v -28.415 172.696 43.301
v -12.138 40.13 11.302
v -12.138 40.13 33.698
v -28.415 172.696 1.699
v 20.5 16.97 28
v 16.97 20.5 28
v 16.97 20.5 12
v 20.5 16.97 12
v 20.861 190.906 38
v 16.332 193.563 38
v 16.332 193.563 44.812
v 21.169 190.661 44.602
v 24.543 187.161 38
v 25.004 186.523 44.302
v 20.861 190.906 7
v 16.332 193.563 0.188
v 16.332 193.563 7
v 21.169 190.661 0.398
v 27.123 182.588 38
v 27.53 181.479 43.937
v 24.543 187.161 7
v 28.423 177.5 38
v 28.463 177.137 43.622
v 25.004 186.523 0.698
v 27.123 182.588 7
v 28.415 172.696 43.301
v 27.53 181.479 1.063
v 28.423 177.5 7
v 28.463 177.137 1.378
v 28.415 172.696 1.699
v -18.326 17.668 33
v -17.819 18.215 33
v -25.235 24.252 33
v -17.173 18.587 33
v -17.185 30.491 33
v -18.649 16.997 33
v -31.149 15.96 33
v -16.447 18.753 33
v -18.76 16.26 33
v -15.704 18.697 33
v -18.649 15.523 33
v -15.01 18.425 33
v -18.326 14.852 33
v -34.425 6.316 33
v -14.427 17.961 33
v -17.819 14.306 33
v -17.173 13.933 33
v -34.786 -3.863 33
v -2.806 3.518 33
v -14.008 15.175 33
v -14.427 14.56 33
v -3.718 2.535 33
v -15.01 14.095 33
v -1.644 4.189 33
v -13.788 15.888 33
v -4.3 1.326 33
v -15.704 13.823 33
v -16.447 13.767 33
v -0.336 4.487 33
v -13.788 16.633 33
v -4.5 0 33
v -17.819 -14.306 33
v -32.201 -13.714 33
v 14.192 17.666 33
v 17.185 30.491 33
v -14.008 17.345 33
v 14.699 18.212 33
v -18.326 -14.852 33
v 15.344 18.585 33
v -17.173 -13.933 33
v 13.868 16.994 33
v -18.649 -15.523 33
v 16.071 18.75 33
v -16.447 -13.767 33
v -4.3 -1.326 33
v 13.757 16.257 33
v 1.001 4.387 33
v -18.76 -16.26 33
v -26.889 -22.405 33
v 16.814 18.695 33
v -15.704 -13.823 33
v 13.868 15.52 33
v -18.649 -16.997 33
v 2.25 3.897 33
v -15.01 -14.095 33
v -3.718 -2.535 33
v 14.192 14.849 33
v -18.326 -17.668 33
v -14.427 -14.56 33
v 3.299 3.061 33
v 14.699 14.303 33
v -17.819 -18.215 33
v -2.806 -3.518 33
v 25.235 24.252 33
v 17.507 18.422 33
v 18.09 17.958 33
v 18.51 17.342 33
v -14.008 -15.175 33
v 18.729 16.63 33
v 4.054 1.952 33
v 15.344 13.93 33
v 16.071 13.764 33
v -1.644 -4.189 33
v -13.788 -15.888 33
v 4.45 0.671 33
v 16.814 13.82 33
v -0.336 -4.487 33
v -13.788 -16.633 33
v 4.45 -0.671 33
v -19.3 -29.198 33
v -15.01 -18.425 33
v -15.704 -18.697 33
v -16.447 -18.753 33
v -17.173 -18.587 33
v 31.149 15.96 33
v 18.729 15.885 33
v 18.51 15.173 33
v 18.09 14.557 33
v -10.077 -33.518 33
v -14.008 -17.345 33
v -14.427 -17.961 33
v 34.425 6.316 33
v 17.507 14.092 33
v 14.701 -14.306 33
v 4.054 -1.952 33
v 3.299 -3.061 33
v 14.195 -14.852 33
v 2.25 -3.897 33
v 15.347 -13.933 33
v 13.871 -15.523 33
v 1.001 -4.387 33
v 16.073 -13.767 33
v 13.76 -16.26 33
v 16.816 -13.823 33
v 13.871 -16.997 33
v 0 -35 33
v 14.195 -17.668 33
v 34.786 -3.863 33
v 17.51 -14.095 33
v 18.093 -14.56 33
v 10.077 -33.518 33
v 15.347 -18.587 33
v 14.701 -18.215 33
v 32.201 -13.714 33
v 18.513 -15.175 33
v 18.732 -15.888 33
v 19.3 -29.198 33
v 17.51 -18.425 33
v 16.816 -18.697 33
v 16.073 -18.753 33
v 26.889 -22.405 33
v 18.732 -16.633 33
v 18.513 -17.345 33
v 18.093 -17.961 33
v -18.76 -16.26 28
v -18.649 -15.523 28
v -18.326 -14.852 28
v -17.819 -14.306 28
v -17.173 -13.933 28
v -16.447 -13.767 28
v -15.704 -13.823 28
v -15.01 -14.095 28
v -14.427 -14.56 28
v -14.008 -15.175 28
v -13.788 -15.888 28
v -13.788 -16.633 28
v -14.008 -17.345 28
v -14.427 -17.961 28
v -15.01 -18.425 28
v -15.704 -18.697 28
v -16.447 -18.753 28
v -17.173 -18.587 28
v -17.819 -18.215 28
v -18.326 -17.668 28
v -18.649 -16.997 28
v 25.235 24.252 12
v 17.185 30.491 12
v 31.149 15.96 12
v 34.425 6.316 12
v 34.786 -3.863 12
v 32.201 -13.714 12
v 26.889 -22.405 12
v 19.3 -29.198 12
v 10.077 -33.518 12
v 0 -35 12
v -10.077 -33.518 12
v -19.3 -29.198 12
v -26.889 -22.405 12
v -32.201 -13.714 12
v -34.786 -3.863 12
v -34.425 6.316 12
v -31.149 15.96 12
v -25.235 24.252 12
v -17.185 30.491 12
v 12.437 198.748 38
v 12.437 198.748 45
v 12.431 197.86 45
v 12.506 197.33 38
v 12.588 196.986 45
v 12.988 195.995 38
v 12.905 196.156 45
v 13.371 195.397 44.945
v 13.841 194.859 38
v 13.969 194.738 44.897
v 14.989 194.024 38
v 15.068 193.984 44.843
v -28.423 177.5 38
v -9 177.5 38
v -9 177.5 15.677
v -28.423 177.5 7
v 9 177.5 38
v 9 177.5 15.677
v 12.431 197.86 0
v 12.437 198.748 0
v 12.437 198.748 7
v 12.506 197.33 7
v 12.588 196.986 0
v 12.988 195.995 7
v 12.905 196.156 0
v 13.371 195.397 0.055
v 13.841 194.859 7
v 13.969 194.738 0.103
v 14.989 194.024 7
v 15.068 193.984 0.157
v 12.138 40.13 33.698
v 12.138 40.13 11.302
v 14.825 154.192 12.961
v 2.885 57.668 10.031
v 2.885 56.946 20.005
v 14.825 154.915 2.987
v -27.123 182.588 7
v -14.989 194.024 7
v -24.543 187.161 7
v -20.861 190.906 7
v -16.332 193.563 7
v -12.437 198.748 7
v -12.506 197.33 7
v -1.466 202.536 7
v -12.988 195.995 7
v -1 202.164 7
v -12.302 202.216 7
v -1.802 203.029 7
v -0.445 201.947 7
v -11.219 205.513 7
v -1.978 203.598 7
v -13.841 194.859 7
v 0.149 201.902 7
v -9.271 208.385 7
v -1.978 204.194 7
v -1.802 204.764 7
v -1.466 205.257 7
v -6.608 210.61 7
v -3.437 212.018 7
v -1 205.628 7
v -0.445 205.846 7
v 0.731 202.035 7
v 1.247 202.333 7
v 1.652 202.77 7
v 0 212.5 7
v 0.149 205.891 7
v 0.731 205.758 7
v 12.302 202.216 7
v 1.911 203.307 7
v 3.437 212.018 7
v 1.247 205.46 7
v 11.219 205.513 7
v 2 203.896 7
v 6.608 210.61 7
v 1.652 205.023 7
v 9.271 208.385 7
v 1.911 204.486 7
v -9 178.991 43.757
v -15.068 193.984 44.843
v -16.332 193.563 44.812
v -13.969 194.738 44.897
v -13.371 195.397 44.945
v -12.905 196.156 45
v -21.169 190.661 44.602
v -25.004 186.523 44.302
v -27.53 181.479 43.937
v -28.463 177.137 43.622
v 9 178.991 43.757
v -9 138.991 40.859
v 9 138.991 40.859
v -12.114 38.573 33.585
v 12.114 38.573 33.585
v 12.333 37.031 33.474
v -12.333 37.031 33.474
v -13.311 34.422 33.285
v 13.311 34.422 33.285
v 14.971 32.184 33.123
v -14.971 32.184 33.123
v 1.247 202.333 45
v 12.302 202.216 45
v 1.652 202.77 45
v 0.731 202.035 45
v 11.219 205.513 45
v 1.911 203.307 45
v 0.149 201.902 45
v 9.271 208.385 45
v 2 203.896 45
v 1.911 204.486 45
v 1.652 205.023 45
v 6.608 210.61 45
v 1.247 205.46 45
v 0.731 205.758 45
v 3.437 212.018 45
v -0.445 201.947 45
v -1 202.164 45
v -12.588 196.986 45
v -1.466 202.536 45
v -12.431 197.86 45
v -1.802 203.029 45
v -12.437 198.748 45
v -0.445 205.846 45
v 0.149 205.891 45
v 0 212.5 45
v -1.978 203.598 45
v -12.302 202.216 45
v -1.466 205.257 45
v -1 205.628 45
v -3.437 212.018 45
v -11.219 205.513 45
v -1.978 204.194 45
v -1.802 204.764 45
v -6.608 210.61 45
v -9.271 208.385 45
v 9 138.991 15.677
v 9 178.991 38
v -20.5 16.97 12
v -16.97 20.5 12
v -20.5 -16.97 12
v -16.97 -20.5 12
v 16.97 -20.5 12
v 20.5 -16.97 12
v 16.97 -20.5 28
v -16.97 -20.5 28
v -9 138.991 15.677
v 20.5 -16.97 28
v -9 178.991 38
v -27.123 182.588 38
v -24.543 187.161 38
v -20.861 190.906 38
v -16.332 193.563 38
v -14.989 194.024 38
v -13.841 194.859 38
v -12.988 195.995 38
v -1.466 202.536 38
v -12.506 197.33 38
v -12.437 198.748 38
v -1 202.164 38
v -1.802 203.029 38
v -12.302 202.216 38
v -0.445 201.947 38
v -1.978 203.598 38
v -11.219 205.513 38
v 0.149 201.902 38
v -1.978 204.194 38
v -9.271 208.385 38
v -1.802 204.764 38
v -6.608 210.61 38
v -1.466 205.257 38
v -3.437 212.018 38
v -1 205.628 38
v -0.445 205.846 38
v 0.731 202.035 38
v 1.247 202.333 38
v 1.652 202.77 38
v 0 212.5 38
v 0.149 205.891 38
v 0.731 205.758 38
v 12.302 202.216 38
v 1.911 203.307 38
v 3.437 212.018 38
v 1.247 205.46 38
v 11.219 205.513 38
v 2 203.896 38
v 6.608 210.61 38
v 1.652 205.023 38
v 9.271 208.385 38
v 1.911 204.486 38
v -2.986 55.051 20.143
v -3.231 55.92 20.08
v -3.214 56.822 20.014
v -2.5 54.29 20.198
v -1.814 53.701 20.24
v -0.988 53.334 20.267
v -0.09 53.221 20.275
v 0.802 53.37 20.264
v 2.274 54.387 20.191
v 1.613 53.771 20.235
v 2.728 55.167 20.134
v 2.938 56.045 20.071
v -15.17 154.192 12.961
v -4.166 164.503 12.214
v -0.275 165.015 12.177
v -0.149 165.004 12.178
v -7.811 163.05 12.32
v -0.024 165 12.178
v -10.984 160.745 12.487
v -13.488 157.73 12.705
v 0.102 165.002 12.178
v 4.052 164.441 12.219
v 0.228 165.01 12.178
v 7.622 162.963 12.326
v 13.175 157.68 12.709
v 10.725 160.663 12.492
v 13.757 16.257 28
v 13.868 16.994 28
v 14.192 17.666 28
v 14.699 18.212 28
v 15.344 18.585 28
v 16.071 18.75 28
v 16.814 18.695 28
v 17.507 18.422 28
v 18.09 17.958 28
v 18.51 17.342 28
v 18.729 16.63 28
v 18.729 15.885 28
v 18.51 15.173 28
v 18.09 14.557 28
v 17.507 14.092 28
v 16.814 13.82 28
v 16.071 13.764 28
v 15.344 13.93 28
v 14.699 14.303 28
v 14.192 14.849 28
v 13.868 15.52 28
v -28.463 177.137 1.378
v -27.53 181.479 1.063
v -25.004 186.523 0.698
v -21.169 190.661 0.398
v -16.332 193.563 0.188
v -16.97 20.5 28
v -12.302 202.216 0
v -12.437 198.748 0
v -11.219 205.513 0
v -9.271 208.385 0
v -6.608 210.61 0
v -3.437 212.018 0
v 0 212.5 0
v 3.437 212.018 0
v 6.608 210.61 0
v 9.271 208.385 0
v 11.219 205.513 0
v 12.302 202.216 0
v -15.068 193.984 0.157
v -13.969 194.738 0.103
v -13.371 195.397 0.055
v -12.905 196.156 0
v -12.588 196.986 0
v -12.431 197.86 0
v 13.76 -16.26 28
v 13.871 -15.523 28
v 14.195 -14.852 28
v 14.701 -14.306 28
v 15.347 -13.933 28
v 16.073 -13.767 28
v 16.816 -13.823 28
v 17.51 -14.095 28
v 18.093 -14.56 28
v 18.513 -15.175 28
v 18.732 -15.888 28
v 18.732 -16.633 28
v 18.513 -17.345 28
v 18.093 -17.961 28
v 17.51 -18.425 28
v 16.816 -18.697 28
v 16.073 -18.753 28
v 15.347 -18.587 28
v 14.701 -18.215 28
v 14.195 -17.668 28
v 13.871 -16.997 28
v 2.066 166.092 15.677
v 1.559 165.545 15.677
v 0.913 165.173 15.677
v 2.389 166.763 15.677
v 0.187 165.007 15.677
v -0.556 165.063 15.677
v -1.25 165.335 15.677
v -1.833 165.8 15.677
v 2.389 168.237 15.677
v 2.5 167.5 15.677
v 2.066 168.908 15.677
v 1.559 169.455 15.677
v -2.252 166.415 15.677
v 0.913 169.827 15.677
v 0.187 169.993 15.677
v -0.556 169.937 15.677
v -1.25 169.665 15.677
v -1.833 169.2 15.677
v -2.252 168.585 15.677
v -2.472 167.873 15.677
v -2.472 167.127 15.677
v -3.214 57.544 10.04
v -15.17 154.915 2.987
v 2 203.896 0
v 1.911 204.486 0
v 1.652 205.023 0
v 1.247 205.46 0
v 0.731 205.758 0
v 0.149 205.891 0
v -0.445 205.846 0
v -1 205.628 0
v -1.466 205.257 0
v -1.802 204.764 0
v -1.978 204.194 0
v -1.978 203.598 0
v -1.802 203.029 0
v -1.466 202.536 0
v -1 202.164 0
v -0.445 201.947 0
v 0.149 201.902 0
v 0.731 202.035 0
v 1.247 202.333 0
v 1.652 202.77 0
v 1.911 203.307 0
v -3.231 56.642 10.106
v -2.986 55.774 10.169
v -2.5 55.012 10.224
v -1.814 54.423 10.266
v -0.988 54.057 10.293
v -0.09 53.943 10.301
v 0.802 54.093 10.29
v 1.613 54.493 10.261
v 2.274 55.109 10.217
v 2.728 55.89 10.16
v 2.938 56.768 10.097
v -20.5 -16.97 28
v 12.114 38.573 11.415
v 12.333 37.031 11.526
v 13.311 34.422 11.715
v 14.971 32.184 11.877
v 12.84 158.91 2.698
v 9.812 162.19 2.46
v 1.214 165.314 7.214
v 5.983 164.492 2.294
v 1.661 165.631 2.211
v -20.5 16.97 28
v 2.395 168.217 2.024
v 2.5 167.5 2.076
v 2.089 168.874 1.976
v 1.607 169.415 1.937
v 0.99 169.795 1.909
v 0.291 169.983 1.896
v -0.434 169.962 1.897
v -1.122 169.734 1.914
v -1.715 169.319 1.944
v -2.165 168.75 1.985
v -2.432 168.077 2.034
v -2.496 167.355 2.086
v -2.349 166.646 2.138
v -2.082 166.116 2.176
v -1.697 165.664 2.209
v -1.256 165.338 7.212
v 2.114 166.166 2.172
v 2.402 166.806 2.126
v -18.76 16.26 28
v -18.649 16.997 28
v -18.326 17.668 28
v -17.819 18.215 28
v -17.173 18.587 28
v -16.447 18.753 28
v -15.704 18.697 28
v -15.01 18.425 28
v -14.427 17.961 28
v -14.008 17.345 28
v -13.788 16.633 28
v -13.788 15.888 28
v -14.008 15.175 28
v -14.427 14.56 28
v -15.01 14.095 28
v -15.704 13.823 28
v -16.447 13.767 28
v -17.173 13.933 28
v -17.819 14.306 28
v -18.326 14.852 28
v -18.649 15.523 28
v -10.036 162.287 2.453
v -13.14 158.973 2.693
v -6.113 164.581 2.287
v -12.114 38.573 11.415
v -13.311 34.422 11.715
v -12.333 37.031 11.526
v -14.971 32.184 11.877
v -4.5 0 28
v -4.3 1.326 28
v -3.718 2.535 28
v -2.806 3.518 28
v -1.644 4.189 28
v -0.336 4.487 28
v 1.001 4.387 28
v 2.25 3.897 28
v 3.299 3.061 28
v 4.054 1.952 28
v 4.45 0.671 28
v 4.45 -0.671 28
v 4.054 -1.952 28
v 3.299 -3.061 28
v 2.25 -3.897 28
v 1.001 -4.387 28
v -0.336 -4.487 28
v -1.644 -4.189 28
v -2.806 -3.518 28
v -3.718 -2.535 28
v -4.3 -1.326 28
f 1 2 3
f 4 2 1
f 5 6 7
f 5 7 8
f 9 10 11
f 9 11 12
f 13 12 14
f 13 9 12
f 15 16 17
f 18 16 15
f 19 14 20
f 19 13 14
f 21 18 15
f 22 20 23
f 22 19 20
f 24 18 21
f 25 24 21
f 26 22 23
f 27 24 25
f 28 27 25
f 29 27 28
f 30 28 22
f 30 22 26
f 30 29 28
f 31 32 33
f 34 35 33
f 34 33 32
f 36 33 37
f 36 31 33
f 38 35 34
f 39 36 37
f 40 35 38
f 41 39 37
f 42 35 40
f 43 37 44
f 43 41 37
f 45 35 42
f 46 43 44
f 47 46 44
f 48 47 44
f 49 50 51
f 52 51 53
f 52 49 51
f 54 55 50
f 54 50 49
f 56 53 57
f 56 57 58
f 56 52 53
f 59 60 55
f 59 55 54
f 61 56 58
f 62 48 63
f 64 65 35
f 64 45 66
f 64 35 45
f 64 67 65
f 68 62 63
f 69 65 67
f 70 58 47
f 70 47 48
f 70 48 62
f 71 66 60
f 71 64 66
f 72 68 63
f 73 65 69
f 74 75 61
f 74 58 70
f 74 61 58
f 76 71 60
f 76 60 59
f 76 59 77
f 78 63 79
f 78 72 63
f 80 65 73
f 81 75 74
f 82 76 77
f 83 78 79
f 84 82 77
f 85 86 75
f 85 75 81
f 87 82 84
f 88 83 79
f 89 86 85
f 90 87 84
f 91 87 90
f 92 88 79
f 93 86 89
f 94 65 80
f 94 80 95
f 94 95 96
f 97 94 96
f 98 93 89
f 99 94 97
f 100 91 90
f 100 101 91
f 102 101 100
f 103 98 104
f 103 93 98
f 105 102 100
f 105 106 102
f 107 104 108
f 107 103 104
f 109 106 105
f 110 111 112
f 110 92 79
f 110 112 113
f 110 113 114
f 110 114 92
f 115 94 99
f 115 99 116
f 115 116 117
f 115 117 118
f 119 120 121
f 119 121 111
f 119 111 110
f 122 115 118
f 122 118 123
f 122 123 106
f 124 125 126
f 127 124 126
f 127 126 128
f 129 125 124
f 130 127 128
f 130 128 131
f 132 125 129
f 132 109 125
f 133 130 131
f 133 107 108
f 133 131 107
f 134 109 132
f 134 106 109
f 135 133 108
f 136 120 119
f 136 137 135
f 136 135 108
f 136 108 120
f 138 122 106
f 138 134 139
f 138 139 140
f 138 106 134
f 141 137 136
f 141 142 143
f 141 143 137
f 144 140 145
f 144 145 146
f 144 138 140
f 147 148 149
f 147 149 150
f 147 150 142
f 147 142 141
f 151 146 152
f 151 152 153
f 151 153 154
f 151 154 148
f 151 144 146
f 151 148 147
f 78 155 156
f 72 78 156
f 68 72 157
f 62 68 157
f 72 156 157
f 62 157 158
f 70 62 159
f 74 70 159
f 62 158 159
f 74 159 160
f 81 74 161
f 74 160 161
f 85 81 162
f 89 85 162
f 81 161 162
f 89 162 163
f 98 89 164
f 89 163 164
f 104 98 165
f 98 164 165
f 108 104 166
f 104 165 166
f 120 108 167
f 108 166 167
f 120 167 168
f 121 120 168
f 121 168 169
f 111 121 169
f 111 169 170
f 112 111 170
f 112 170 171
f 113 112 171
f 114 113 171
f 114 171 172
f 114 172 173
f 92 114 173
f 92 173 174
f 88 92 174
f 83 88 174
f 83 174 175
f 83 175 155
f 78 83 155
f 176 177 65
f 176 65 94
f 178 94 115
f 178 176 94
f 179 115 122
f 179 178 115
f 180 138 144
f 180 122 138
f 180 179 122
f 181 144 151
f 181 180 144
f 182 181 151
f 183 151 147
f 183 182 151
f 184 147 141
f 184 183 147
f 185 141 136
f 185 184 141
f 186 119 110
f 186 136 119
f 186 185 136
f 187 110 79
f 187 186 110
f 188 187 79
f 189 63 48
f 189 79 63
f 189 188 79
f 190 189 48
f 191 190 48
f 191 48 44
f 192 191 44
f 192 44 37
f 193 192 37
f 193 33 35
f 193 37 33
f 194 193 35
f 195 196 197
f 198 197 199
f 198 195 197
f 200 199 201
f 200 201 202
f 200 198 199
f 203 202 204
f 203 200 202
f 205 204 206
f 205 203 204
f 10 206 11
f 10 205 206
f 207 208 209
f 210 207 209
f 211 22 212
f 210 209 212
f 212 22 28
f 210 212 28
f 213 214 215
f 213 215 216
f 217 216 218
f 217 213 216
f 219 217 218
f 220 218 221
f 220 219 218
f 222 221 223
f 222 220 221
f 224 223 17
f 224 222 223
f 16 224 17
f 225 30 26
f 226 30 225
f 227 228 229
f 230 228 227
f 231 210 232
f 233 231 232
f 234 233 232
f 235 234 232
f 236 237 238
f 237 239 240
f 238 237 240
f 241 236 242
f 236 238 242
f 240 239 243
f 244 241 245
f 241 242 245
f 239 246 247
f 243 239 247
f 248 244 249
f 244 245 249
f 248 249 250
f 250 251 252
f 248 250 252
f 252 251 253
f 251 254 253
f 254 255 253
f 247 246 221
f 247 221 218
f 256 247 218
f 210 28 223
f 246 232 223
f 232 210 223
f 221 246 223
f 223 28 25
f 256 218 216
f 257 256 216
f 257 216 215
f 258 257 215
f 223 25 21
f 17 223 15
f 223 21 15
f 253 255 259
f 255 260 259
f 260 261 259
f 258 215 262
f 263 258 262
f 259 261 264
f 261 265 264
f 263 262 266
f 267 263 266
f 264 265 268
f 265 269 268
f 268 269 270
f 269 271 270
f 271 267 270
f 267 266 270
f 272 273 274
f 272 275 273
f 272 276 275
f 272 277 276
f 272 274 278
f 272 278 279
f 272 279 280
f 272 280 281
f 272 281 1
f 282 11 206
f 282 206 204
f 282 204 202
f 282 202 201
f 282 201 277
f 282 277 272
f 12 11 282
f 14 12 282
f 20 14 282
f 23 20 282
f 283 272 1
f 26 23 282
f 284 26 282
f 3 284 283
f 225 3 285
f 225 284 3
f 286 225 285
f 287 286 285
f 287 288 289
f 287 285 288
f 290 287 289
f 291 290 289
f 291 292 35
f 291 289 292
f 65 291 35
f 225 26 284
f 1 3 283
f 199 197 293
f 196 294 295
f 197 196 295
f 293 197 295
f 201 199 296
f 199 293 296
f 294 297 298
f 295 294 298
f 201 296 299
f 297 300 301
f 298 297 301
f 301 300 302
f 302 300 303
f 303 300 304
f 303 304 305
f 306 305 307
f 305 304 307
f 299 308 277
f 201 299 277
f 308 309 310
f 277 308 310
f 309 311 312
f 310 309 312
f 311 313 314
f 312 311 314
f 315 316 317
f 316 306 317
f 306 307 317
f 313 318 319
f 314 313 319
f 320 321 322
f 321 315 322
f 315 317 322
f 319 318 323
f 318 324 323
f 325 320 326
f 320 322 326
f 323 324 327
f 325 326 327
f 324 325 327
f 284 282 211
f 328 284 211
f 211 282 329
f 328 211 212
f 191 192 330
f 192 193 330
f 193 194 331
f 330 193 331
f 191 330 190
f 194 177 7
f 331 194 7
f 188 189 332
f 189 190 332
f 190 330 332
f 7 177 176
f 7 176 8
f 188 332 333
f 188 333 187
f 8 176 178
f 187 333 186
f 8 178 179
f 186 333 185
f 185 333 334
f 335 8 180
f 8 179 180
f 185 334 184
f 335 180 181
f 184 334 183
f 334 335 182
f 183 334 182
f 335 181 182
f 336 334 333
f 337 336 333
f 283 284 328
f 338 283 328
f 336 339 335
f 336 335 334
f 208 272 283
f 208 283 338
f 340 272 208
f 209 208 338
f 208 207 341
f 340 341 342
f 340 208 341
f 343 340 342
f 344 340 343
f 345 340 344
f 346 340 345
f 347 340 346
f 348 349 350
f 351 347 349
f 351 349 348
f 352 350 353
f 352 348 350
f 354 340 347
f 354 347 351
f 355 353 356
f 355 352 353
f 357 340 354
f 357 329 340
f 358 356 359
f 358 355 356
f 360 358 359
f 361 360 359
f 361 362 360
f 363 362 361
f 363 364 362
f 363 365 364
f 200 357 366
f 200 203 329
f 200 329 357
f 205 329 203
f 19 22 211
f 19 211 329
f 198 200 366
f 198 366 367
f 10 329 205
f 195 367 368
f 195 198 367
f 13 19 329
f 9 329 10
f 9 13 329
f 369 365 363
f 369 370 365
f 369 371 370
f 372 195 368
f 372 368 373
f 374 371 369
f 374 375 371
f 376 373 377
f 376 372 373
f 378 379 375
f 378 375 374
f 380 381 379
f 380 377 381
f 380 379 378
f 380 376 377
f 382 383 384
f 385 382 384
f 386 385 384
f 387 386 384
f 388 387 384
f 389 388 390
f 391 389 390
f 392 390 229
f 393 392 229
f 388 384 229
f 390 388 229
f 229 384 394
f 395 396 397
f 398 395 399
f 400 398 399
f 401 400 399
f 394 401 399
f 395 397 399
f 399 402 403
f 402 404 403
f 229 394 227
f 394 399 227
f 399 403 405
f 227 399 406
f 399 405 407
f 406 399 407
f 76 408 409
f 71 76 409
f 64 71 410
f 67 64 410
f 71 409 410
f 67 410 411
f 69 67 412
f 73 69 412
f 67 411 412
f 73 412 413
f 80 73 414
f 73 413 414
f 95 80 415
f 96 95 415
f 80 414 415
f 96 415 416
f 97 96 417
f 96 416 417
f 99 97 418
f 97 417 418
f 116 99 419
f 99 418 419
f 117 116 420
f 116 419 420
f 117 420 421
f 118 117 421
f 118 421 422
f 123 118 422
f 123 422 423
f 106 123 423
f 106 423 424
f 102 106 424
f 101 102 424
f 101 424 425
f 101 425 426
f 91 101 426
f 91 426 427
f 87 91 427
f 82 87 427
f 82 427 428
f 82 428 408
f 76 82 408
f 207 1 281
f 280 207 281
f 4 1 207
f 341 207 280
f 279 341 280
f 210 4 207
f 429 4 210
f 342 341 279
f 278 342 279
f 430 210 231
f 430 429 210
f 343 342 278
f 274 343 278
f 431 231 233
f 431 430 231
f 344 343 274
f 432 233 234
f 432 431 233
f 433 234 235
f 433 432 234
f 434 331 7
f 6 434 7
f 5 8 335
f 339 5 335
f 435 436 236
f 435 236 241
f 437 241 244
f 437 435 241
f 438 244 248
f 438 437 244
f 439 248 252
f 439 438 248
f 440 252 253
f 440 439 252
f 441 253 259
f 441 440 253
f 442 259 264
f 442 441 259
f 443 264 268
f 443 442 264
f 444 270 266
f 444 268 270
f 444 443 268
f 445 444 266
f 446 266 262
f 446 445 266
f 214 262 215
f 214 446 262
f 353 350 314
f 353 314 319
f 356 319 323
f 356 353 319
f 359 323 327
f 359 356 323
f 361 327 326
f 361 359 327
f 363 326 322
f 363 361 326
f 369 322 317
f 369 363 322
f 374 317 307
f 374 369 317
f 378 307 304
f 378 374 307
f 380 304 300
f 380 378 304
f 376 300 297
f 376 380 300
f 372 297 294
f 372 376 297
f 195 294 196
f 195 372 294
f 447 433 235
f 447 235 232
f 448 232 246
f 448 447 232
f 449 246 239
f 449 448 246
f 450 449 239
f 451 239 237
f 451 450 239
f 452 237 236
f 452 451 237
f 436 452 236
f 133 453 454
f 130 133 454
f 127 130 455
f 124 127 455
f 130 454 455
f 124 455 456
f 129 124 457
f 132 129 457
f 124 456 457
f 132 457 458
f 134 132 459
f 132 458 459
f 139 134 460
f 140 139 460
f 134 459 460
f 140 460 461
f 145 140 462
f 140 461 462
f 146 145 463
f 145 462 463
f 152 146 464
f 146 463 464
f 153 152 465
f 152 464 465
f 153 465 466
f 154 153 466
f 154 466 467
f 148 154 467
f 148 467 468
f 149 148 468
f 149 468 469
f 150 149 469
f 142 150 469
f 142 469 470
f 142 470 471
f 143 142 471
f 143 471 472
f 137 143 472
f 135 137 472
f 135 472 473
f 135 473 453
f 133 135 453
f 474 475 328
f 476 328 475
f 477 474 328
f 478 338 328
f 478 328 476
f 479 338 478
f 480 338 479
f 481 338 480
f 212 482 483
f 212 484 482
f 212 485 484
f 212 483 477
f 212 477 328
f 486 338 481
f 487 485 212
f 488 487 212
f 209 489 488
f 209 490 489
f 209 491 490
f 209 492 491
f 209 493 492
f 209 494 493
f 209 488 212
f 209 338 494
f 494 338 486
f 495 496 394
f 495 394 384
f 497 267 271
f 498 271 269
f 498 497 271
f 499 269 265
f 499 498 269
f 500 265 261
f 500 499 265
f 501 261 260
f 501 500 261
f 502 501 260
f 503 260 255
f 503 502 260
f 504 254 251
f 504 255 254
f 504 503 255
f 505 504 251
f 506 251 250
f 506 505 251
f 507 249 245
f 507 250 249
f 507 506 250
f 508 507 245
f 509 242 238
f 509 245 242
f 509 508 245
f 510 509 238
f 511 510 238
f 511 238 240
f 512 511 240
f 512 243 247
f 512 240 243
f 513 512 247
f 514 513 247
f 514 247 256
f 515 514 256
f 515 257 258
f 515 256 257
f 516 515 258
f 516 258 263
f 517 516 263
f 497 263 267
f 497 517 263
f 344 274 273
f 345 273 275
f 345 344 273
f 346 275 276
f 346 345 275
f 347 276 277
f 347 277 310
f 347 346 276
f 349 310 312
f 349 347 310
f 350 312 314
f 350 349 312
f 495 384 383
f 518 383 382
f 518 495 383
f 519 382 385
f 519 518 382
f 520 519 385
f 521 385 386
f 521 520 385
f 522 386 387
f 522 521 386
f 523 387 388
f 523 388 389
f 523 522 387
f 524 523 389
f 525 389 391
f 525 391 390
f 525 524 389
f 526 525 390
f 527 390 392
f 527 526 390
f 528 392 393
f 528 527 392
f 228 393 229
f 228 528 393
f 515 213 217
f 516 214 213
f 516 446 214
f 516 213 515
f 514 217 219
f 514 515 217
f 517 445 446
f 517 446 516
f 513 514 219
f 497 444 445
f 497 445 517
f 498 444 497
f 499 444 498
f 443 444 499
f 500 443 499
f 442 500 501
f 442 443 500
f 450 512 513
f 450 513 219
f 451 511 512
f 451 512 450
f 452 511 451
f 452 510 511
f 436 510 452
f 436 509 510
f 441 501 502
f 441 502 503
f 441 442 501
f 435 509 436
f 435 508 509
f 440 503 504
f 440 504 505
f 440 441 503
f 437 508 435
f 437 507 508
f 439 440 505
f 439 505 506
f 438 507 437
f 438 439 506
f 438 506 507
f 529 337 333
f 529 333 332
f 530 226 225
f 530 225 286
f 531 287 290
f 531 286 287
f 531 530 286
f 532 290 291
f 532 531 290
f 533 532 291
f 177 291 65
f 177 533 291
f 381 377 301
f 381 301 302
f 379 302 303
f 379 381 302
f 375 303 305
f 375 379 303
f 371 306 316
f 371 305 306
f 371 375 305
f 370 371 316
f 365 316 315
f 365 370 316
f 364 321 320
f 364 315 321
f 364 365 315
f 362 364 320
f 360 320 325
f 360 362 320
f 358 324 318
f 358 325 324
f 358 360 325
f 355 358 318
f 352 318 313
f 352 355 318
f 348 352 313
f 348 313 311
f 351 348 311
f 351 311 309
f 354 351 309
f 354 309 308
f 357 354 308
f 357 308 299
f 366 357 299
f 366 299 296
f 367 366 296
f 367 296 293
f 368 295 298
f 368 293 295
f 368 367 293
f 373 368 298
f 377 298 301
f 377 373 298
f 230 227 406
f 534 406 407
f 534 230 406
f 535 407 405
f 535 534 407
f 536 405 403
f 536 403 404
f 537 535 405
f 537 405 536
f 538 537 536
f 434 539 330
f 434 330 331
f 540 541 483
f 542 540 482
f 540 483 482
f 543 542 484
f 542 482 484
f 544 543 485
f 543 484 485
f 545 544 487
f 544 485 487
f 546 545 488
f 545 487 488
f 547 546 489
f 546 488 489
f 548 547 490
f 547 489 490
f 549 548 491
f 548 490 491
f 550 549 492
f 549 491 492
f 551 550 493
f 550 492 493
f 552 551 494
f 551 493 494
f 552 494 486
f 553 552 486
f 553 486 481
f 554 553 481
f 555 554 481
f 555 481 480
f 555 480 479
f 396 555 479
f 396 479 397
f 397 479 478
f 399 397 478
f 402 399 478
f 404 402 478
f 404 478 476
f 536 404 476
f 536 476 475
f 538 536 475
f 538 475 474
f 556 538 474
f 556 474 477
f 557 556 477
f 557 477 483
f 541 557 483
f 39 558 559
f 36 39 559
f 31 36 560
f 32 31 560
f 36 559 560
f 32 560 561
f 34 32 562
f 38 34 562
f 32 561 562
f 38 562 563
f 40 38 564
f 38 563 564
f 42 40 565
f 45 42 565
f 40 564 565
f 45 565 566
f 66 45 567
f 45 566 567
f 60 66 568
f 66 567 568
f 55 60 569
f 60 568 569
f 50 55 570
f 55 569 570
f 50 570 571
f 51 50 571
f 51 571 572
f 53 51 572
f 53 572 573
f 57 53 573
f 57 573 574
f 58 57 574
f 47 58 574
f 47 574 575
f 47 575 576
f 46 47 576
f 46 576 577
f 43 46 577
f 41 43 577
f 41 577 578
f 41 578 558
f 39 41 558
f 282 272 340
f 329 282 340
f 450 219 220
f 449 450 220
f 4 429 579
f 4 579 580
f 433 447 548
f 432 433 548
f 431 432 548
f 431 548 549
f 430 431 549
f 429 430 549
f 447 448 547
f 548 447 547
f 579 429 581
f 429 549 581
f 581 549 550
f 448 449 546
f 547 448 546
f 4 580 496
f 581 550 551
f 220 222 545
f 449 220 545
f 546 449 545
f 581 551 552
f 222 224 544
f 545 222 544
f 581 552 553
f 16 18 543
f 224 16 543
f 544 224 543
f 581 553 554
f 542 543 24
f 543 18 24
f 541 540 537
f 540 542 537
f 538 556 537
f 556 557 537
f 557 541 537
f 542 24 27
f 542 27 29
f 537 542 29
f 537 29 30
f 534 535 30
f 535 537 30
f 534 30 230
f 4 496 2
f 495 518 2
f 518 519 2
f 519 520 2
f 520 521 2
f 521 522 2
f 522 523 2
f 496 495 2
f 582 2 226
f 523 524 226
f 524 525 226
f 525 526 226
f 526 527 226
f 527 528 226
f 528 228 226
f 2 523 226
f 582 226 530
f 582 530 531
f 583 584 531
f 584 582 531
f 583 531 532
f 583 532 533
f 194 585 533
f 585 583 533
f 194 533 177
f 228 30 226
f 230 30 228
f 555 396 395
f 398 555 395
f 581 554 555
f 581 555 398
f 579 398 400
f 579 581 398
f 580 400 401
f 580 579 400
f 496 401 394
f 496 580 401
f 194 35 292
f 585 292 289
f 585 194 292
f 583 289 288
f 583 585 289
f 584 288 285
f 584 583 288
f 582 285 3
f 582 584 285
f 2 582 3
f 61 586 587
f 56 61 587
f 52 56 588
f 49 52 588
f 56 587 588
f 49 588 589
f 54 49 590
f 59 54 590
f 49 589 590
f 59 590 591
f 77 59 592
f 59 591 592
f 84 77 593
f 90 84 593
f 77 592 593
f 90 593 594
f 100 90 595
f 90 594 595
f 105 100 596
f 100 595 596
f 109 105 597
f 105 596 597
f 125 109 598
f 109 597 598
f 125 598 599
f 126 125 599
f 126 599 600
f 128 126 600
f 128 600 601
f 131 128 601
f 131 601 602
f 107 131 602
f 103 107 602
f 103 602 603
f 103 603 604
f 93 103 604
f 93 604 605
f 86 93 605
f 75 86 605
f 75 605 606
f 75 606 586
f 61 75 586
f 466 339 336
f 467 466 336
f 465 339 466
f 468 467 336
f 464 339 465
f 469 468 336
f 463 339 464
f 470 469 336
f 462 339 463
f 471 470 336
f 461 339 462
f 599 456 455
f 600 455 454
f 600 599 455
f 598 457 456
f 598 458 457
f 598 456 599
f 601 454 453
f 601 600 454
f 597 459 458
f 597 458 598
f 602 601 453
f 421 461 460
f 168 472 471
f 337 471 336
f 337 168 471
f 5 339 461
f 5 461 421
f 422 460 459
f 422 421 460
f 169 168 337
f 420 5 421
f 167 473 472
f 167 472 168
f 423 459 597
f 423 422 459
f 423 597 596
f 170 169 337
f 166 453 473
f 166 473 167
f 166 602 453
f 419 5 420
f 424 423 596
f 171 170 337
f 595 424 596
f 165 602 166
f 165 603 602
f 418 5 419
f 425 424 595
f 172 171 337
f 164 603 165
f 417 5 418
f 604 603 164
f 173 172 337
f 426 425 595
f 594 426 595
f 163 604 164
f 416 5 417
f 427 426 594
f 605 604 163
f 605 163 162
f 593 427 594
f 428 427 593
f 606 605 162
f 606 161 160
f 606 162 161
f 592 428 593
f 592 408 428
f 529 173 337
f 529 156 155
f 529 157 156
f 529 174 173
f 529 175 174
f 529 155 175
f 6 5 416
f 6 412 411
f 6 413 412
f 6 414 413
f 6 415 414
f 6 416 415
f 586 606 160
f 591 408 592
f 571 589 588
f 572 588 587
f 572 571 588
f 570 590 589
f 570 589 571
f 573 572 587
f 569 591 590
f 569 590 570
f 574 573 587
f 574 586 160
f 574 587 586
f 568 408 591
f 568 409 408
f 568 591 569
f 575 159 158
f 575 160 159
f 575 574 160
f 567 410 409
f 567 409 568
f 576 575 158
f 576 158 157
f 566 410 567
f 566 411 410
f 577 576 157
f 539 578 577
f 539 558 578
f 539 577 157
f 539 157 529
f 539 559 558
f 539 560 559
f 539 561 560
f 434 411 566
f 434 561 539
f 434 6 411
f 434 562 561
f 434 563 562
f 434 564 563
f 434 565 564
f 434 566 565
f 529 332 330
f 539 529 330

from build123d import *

# Parameters (mm, degrees)
BOSS_EXTRUDE1_DEPTH      = 45
CUT_EXTRUDE2_DEPTH       = 36
CUT_EXTRUDE2_DEPTH_BACK  = 36
CUT_EXTRUDE3_DEPTH       = 28
SKETCH6_R                = 4.5
SKETCH6_R_2              = 2.5
CUT_EXTRUDE4_DEPTH       = 29
CUT_EXTRUDE4_DEPTH_BACK  = 18
CUT_EXTRUDE6_DEPTH       = 10
SKETCH12_W               = 33
SKETCH12_H               = 40
CUT_EXTRUDE9_DEPTH       = 9
CUT_EXTRUDE9_DEPTH_BACK  = 9
SKETCH13_W               = 31
SKETCH13_H               = 35
CUT_EXTRUDE10_DEPTH      = 36
CUT_EXTRUDE10_DEPTH_BACK = 36
SKETCH14_R               = 2
CUT_EXTRUDE13_DEPTH      = 46
CUT_EXTRUDE13_DEPTH_BACK = 9
SKETCH15_R               = 2.5
CUT_EXTRUDE14_DEPTH      = 16.676509358


with BuildPart() as part:
    # Sketch1 → Boss-Extrude1 (new body)
    with BuildSketch(Plane.XY):
        with BuildLine():
            Line((-12.137605226, 40.130176139), (-28.41462727, 172.695882476))
            ThreePointArc((-28.41462727, 172.695882476), (-25.871526221, 185.155210183), (-16.331642516, 193.563112938))
            ThreePointArc((-16.331642516, 193.563112938), (-13.372104724, 195.395277041), (-12.437153877, 198.748120036))
            ThreePointArc((-12.437153877, 198.748120036), (0, 212.5), (12.437153877, 198.748120036))
            ThreePointArc((12.437153877, 198.748120036), (13.372104724, 195.395277041), (16.331642516, 193.563112938))
            ThreePointArc((16.331642516, 193.563112938), (25.871526221, 185.155210183), (28.41462727, 172.695882476))
            Line((28.41462727, 172.695882476), (12.137605226, 40.130176139))
            ThreePointArc((12.137605226, 40.130176139), (13.235334505, 34.563989878), (17.184596043, 30.490812695))
            ThreePointArc((17.184596043, 30.490812695), (0, -35), (-17.184596043, 30.490812695))
            ThreePointArc((-17.184596043, 30.490812695), (-13.235334505, 34.563989878), (-12.137605226, 40.130176139))
        make_face()
    extrude(amount=BOSS_EXTRUDE1_DEPTH)

    # Sketch4 → Cut-Extrude2 (cut, two sides)
    with BuildSketch(Plane(origin=(0, 0, 0), x_dir=(0, 0, -1), z_dir=(1, 0, 0))) as cut_extrude2_sk:
        Polygon((-45, 196.155616487), (-33, 30.490812695), (-33, -35), (-45, -35), align=None)
        Polygon((-12, -35), (0, -35), (0, 196.155616487), (-12, 30.490812695), align=None)
    extrude(amount=CUT_EXTRUDE2_DEPTH, mode=Mode.SUBTRACT)
    extrude(cut_extrude2_sk.sketch, amount=-CUT_EXTRUDE2_DEPTH_BACK, mode=Mode.SUBTRACT)

    # Sketch5 → Cut-Extrude3 (cut)
    with BuildSketch(Plane.XY):
        Polygon((16.97, -20.5), (-16.97, -20.5), (-20.5, -16.97), (-20.5, 16.97), (-16.97, 20.5), (16.97, 20.5), (20.5, 16.97), (20.5, -16.97), align=None)
    extrude(amount=CUT_EXTRUDE3_DEPTH, mode=Mode.SUBTRACT)

    # Sketch6 → Cut-Extrude4 (cut, two sides)
    with BuildSketch(Plane(origin=(0, 0, 28), x_dir=(-1, 0, 0), z_dir=(0, 0, -1))) as cut_extrude4_sk:
        Circle(SKETCH6_R)
        with Locations((-16.257359313, 16.257359313)):
            Circle(SKETCH6_R_2)
        with Locations((16.260126266, 16.260126266)):
            Circle(SKETCH6_R_2)
        with Locations((-16.260126266, -16.260126266)):
            Circle(SKETCH6_R_2)
        with Locations((16.260126266, -16.260126266)):
            Circle(SKETCH6_R_2)
    extrude(amount=CUT_EXTRUDE4_DEPTH, mode=Mode.SUBTRACT)
    extrude(cut_extrude4_sk.sketch, amount=-CUT_EXTRUDE4_DEPTH_BACK, mode=Mode.SUBTRACT)

    # Sketch8 → Cut-Extrude6 (cut, along a direction that is not the sketch's normal)
    with BuildSketch(Plane(origin=(0, 1.023835067, 14.134452964), x_dir=(-1, 0, 0), z_dir=(0, -0.072246136, -0.997386834))):
        with BuildLine():
            Line((-2.88453501, 56.792957469), (-14.82487519, 154.294010847))
            ThreePointArc((-14.82487519, 154.294010847), (0.17238227, 165.145626965), (15.16963973, 154.294010847))
            Line((15.16963973, 154.294010847), (3.214085595, 56.668725114))
            ThreePointArc((3.214085595, 56.668725114), (0.089957546, 53.058005434), (-2.88453501, 56.792957469))
        make_face()
    extrude(amount=-CUT_EXTRUDE6_DEPTH, dir=(0, 0.072246136, -0.997386834), mode=Mode.SUBTRACT)

    # Sketch12 → Cut-Extrude9 (cut, two sides)
    with BuildSketch(Plane(origin=(0, 0, 0), x_dir=(0, 0, -1), z_dir=(1, 0, 0))) as cut_extrude9_sk:
        with Locations((-32.176509358, 158.99066374)):
            Rectangle(SKETCH12_W, SKETCH12_H)
    extrude(amount=CUT_EXTRUDE9_DEPTH, mode=Mode.SUBTRACT)
    extrude(cut_extrude9_sk.sketch, amount=-CUT_EXTRUDE9_DEPTH_BACK, mode=Mode.SUBTRACT)

    # Sketch13 → Cut-Extrude10 (cut, two sides)
    with BuildSketch(Plane(origin=(0, 0, 0), x_dir=(0, 0, -1), z_dir=(1, 0, 0))) as cut_extrude10_sk:
        with Locations((-22.5, 195)):
            Rectangle(SKETCH13_W, SKETCH13_H)
    extrude(amount=CUT_EXTRUDE10_DEPTH, mode=Mode.SUBTRACT)
    extrude(cut_extrude10_sk.sketch, amount=-CUT_EXTRUDE10_DEPTH_BACK, mode=Mode.SUBTRACT)

    # Sketch14 → Cut-Extrude13 (cut, two sides)
    with BuildSketch(Plane.XY) as cut_extrude13_sk:
        with Locations((0, 203.896404583)):
            Circle(SKETCH14_R)
    extrude(amount=CUT_EXTRUDE13_DEPTH, mode=Mode.SUBTRACT)
    extrude(cut_extrude13_sk.sketch, amount=-CUT_EXTRUDE13_DEPTH_BACK, mode=Mode.SUBTRACT)

    # Sketch15 → Cut-Extrude14 (cut, through all)
    with BuildSketch(Plane.XY.offset(15.676509358)):
        with Locations((0, 167.5)):
            Circle(SKETCH15_R)
    extrude(amount=-CUT_EXTRUDE14_DEPTH, mode=Mode.SUBTRACT)


solid = part.part
